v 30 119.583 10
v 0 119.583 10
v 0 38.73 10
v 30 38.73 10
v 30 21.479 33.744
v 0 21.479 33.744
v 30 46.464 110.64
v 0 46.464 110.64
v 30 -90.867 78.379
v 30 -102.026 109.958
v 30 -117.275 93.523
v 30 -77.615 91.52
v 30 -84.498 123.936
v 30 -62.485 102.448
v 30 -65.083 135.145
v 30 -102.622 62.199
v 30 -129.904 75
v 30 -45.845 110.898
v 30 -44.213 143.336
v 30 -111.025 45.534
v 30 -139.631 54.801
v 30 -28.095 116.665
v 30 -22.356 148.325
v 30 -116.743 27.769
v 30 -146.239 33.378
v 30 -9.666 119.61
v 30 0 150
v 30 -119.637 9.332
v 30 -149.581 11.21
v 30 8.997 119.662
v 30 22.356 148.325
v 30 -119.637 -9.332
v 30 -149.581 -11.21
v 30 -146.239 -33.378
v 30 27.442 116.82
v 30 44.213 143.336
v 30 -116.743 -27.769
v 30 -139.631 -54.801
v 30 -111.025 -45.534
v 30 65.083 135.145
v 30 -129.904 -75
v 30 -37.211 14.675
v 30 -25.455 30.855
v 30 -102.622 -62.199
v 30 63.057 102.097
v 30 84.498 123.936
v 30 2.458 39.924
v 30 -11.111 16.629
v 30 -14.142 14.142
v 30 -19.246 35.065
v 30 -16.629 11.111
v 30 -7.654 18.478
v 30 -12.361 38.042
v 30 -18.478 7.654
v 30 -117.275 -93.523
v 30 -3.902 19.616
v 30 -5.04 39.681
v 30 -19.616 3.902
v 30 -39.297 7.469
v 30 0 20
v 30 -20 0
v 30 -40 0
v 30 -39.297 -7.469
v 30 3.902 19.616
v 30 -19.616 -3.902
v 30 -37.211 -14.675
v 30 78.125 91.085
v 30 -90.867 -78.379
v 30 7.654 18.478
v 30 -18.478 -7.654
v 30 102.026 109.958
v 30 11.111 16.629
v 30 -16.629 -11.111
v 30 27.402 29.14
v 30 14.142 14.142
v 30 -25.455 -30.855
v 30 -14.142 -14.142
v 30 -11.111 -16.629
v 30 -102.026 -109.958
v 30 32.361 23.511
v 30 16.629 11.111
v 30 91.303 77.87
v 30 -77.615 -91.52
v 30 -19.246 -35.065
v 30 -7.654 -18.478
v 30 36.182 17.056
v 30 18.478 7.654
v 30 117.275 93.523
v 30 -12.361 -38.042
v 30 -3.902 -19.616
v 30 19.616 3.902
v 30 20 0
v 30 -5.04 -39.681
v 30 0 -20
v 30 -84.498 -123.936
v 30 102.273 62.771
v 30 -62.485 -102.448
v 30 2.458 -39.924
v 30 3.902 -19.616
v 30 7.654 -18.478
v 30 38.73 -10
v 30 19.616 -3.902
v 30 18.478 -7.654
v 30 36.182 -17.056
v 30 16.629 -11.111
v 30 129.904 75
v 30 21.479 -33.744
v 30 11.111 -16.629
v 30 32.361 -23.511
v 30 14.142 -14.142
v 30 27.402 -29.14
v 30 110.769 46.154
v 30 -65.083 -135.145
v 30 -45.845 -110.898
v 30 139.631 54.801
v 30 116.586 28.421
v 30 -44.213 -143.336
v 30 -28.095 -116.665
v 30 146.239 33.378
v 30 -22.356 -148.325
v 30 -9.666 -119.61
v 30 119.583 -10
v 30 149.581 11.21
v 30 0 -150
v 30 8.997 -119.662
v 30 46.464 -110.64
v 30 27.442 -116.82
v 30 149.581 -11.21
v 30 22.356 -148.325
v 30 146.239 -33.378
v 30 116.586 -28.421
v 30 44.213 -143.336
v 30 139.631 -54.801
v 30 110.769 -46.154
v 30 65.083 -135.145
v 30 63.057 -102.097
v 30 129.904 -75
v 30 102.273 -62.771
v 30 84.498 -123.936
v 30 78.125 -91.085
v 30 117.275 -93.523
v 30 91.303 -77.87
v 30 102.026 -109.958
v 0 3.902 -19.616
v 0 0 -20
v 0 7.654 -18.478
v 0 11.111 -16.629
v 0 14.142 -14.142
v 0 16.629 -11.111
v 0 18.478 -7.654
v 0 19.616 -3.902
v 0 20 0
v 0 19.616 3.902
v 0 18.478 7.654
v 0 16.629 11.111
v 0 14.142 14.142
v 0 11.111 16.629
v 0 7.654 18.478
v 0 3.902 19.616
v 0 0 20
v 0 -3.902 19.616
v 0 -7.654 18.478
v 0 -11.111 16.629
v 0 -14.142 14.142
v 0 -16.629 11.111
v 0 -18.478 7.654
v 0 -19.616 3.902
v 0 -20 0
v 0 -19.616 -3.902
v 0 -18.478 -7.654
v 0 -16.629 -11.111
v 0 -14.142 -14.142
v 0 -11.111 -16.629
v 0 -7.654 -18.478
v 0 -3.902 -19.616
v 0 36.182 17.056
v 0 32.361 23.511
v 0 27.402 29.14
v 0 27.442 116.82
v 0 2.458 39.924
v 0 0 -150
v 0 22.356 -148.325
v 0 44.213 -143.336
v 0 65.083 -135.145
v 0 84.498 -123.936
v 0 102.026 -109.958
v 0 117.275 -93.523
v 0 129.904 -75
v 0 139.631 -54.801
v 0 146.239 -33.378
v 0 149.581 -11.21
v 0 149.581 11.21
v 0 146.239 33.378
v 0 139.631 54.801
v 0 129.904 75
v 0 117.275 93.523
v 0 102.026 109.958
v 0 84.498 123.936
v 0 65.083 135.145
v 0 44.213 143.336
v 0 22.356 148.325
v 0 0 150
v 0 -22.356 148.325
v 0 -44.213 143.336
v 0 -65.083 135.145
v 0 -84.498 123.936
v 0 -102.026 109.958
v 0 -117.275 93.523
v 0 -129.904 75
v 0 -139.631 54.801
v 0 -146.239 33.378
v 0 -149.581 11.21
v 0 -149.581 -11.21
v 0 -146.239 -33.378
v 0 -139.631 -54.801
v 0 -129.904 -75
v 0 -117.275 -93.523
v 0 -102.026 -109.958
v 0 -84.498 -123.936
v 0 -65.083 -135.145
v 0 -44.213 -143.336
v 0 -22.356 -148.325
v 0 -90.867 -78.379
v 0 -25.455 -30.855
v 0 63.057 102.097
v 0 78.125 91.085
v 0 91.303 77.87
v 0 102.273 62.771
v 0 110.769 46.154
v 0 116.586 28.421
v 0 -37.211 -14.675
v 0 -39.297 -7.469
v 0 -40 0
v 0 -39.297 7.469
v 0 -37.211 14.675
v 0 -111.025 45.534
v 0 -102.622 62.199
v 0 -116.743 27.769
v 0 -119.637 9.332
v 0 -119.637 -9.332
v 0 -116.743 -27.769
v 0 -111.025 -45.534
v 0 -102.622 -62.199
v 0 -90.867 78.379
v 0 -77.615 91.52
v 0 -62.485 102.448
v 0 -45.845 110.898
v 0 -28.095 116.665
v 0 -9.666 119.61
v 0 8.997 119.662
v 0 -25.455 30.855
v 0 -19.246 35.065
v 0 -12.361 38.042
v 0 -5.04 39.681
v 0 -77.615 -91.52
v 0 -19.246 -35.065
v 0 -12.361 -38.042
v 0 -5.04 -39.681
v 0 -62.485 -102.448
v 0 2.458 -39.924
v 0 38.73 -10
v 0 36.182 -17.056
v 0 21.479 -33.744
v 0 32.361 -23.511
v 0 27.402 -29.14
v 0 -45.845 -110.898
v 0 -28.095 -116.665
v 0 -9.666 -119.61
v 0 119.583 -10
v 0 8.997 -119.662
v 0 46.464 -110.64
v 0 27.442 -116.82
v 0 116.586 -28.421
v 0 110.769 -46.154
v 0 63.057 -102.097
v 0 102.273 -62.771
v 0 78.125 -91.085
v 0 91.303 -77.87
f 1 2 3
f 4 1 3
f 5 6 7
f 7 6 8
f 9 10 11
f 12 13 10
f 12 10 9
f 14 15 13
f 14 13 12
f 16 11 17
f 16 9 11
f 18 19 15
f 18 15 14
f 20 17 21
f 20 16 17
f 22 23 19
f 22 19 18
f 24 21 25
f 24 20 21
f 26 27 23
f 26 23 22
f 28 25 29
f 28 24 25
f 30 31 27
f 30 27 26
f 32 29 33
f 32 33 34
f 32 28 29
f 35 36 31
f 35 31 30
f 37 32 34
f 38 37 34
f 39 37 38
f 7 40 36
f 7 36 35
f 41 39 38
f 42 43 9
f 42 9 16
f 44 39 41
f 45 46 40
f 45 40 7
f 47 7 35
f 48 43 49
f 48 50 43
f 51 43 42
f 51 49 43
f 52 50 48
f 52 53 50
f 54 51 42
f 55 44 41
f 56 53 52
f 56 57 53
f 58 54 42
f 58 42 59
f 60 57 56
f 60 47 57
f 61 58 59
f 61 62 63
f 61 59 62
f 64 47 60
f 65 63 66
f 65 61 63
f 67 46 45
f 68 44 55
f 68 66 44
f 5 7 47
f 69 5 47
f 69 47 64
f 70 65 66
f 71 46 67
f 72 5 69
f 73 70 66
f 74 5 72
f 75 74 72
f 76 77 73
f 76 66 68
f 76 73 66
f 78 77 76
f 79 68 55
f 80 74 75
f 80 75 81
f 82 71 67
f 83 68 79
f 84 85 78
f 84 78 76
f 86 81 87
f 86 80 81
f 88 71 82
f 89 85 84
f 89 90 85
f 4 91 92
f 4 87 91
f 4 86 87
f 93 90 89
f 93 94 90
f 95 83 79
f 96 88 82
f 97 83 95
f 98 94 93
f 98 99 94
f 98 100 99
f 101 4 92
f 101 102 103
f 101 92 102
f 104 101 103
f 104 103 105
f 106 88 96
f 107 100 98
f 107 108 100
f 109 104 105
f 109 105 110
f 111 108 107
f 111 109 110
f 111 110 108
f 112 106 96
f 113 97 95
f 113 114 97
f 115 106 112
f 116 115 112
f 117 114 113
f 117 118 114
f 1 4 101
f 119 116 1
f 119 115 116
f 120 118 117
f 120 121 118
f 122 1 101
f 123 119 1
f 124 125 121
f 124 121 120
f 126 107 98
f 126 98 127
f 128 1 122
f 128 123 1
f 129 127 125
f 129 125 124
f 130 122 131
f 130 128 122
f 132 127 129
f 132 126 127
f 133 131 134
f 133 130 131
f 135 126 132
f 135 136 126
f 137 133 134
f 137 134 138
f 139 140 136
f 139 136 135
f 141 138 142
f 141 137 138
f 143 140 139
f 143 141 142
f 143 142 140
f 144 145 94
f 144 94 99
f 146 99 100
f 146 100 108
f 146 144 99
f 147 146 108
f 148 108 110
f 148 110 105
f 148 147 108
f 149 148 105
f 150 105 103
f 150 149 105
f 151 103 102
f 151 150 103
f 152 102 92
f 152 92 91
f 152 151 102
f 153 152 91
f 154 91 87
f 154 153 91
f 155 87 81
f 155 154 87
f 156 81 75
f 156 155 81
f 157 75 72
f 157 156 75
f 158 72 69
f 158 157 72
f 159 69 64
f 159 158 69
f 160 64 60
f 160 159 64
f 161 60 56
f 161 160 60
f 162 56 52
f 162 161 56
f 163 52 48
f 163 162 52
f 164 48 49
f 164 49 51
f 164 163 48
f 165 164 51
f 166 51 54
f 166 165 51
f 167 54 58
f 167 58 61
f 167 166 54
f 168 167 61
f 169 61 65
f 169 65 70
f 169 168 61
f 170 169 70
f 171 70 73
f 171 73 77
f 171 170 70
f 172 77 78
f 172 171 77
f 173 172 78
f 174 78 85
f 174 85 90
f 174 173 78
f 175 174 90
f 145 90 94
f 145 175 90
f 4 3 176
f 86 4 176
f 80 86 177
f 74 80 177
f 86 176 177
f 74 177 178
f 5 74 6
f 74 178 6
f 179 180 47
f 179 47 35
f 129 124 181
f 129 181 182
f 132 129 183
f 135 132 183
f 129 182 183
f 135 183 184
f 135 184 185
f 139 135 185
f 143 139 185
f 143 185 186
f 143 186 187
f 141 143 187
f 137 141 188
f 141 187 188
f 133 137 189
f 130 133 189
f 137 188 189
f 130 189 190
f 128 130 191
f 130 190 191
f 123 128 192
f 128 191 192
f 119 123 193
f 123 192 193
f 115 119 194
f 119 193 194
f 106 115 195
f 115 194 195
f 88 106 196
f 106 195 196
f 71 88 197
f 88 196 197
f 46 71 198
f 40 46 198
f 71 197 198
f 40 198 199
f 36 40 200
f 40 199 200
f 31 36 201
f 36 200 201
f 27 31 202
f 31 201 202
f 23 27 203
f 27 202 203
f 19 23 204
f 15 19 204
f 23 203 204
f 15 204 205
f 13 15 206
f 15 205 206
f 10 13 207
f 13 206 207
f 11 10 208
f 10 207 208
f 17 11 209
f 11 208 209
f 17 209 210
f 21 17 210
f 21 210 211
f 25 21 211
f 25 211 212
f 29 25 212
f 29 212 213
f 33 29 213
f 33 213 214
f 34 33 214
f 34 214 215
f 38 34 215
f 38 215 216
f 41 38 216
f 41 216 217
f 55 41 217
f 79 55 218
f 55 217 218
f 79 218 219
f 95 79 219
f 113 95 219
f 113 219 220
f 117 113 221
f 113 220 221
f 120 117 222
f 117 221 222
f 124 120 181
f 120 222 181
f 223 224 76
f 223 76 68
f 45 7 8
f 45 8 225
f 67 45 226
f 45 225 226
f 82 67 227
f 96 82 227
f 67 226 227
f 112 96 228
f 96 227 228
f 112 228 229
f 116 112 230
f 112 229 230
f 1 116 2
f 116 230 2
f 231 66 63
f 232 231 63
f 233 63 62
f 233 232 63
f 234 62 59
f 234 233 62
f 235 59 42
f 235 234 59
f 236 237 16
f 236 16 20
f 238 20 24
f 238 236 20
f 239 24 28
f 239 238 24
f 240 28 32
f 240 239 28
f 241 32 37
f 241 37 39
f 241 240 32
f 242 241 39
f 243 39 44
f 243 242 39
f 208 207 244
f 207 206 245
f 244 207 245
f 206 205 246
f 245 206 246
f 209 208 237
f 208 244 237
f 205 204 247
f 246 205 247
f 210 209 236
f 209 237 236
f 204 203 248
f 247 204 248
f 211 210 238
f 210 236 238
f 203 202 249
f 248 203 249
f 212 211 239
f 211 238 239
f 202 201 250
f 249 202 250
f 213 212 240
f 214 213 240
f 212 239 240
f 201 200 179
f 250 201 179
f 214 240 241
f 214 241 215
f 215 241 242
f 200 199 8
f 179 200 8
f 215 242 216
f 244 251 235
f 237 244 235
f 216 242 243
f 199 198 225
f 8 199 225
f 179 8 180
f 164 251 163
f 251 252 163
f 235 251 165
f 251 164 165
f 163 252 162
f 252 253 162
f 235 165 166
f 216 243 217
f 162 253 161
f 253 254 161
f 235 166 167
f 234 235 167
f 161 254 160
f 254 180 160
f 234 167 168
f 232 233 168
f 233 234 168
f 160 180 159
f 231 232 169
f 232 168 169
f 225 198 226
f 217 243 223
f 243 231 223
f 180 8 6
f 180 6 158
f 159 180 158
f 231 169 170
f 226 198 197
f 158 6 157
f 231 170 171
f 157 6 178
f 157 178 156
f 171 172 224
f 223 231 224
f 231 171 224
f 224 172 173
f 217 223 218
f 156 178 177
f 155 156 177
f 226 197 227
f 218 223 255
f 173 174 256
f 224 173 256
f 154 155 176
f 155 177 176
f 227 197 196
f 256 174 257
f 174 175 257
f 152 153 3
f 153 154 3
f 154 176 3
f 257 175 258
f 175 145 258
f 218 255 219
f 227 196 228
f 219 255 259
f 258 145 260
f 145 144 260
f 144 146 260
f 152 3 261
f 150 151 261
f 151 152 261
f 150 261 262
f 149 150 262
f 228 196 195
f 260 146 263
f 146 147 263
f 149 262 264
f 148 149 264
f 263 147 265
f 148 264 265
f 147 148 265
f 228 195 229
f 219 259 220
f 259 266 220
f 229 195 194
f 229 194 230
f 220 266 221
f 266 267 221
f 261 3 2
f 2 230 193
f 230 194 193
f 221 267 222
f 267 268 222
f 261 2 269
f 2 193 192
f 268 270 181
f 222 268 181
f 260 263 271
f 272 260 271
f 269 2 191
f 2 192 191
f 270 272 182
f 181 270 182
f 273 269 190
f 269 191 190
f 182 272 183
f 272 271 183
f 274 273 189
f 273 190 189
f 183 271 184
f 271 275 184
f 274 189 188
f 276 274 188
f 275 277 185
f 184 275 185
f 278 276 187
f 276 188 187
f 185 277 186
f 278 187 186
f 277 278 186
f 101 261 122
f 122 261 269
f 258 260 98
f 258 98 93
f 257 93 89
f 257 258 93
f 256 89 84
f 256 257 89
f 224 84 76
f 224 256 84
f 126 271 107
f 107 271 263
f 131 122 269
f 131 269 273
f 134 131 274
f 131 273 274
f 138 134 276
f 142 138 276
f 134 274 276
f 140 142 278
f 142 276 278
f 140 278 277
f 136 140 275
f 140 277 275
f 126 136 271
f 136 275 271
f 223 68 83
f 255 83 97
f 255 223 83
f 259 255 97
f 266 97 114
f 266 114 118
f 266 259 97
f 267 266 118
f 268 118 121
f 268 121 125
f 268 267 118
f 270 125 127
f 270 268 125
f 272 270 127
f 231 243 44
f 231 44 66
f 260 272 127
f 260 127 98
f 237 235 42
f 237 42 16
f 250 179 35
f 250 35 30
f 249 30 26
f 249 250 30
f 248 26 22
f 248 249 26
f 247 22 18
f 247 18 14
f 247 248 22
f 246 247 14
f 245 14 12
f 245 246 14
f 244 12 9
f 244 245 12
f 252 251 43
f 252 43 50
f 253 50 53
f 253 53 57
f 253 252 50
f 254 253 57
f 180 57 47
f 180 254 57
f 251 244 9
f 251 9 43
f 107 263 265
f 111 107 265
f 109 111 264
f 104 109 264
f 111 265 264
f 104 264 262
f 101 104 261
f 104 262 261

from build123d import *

# Parameters (mm, degrees)
SKETCH1_R           = 150
SKETCH1_R_2         = 20
BOSS_EXTRUDE1_DEPTH = 30


with BuildPart() as part:
    # Sketch1 → Boss-Extrude1 (new body)
    with BuildSketch(Plane(origin=(0, 0, 0), x_dir=(0, 0, -1), z_dir=(1, 0, 0))):
        Circle(SKETCH1_R)
        Circle(SKETCH1_R_2, mode=Mode.SUBTRACT)
        with BuildLine():
            Line((110.639648089, 46.463623091), (33.744090545, 21.478741892))
            ThreePointArc((33.744090545, 21.478741892), (23.511410092, 32.360679775), (10, 38.729833462))
            Line((10, 38.729833462), (10, 119.582607431))
            ThreePointArc((10, 119.582607431), (70.534230275, 97.082039325), (110.639648089, 46.463623091))
        make_face(mode=Mode.SUBTRACT)
        with BuildLine():
            Line((-10, 119.582607431), (-10, 38.729833462))
            ThreePointArc((-10, 38.729833462), (-23.511410092, 32.360679775), (-33.744090545, 21.478741892))
            Line((-33.744090545, 21.478741892), (-110.639648089, 46.463623091))
            ThreePointArc((-110.639648089, 46.463623091), (-70.534230275, 97.082039325), (-10, 119.582607431))
        make_face(mode=Mode.SUBTRACT)
        with BuildLine():
            Line((116.819987977, 27.442492765), (39.924430433, 2.457611566))
            ThreePointArc((39.924430433, 2.457611566), (38.042260652, -12.360679775), (30.854994877, -25.455240937))
            Line((30.854994877, -25.455240937), (78.379063022, -90.86650912))
            ThreePointArc((78.379063022, -90.86650912), (114.126781955, -37.082039325), (116.819987977, 27.442492765))
        make_face(mode=Mode.SUBTRACT)
        with BuildLine():
            Line((62.198723135, -102.622214166), (14.674654989, -37.210945983))
            ThreePointArc((14.674654989, -37.210945983), (0, -40), (-14.674654989, -37.210945983))
            Line((-14.674654989, -37.210945983), (-62.198723135, -102.622214166))
            ThreePointArc((-62.198723135, -102.622214166), (0, -120), (62.198723135, -102.622214166))
        make_face(mode=Mode.SUBTRACT)
        with BuildLine():
            Line((-78.379063022, -90.86650912), (-30.854994877, -25.455240937))
            ThreePointArc((-30.854994877, -25.455240937), (-38.042260652, -12.360679775), (-39.924430433, 2.457611566))
            Line((-39.924430433, 2.457611566), (-116.819987977, 27.442492765))
            ThreePointArc((-116.819987977, 27.442492765), (-114.126781955, -37.082039325), (-78.379063022, -90.86650912))
        make_face(mode=Mode.SUBTRACT)
    extrude(amount=BOSS_EXTRUDE1_DEPTH)


solid = part.part
